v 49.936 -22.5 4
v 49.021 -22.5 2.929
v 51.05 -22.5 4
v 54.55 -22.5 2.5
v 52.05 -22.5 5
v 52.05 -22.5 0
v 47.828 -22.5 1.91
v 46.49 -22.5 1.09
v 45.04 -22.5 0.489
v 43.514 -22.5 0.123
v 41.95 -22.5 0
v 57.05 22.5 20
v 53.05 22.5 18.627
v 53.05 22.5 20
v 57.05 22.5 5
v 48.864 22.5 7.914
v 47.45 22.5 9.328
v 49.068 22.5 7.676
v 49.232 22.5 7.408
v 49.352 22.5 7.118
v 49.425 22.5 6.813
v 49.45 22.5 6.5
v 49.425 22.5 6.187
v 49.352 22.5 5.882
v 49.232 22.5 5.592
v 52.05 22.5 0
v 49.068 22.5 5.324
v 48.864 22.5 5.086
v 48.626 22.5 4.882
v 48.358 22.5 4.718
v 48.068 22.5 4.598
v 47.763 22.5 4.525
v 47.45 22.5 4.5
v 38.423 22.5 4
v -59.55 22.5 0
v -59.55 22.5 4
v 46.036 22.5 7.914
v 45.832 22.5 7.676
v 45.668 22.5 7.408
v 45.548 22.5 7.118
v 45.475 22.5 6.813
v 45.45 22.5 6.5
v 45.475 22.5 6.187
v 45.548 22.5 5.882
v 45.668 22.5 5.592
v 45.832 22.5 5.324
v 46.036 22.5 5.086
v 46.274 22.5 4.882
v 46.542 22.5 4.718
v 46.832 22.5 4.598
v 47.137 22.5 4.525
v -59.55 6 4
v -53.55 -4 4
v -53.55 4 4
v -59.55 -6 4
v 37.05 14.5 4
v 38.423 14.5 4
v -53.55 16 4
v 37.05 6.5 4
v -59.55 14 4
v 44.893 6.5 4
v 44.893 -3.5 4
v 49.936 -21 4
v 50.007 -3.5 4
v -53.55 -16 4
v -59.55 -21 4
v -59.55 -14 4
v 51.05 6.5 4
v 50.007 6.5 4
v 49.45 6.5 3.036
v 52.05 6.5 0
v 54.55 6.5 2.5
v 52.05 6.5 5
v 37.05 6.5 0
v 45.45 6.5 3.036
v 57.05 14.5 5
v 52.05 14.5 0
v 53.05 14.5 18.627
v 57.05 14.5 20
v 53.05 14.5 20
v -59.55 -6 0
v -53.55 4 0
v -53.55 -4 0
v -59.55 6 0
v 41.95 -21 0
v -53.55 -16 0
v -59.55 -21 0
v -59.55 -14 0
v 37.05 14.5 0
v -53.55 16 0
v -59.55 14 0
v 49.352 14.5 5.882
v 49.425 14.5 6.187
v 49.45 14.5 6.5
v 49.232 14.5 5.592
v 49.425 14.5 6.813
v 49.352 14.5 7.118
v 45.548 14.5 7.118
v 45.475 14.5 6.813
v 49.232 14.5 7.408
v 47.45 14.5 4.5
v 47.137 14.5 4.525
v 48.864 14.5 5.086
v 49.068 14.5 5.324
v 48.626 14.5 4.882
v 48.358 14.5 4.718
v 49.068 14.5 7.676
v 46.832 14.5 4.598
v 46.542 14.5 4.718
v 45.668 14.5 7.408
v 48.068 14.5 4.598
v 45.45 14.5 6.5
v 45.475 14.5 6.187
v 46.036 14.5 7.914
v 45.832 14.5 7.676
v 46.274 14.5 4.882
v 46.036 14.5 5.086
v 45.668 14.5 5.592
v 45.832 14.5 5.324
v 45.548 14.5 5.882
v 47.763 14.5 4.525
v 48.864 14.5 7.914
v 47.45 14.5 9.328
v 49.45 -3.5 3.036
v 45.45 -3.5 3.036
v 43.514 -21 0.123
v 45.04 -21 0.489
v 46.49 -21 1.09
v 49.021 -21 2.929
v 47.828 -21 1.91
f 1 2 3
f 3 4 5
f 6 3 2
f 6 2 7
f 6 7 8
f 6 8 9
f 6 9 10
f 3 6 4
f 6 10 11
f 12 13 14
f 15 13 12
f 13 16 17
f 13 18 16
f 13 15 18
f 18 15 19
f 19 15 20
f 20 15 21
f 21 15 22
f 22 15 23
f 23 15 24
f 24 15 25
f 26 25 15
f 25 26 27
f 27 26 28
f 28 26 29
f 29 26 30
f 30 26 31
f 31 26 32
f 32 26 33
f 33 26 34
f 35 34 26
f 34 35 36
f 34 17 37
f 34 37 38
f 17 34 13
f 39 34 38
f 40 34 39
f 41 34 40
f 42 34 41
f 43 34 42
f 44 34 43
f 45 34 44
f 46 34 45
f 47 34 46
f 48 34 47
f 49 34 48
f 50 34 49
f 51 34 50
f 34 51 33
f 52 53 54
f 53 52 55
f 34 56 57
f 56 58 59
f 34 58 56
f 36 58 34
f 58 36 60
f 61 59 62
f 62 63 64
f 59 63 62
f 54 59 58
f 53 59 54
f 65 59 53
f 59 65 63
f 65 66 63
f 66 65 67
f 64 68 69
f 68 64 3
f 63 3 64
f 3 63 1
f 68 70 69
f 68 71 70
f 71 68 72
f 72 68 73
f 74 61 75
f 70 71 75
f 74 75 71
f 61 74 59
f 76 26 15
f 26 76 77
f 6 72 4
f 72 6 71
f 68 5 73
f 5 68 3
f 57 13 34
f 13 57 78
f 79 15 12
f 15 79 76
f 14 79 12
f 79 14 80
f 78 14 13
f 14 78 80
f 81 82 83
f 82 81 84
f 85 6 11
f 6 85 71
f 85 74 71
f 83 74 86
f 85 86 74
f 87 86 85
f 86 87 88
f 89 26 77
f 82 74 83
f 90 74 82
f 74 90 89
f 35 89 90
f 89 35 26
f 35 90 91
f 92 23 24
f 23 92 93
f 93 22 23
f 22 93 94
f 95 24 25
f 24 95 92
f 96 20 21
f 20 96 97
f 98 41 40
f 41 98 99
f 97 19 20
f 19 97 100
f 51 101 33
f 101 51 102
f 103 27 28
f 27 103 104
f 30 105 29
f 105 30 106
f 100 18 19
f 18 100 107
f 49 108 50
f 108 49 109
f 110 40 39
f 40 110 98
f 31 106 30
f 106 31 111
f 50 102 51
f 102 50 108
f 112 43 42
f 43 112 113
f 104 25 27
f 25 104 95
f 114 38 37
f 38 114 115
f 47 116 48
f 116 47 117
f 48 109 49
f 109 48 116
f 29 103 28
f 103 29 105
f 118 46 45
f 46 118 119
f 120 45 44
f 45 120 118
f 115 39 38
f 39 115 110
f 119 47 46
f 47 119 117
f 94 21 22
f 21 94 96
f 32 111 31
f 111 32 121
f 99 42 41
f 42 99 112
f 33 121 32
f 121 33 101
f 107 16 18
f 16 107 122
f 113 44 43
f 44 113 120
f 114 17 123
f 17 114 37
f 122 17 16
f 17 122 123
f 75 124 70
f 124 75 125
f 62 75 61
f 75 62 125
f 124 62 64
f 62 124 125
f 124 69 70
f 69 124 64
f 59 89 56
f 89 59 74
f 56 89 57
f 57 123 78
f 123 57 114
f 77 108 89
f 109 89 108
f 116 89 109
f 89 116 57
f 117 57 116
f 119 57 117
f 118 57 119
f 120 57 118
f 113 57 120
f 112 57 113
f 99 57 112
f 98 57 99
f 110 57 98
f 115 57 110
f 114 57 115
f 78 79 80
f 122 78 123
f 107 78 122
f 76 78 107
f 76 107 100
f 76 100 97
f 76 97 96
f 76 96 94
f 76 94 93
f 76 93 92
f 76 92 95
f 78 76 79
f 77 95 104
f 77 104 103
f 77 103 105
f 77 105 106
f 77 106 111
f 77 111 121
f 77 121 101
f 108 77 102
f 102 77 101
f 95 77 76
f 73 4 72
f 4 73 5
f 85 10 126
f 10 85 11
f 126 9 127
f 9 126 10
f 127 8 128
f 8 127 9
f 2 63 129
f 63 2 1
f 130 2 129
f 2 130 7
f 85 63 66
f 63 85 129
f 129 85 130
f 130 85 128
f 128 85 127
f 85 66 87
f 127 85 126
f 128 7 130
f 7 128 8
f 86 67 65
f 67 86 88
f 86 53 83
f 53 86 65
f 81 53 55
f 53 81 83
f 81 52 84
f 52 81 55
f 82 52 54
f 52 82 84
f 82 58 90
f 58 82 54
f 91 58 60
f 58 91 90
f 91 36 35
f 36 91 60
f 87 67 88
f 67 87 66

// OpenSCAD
// file: ittybox.scad
include <constants.scad>

module panel(wall_thickness, side=false) {
	bolt_x = side ? bolt_offset_y : bolt_offset_x;
	bolt_z = side ? bolt_offset_x : bolt_offset_y;
	width = side ? panel_depth : panel_width;
	overlap_cutout_potition = side ? 0 : -end_corner_height;

	difference() {
		union() {
			// Main panel
			translate([0, 0, wall_thickness/2]) {
				cube([width - corner_radius*2, height, wall_thickness], center=true);
			}

			for (x = [-1, 1]) {
				// Rounded corner
				translate([x*(width/2 - corner_radius), 0, corner_radius]) {
					r = corner_radius;
					rotate([90, 0, 0]) {
						intersection() {
							cylinder(height, r=r, center=true, $fn=4);
							mirror([x > 0 ? 1 : 0, 0, 0]) translate([0, 0, -height/2]) {
								linear_extrude(height=height) polygon([[-r, r], [-r, -r], [r, -r]]);
							}
						}
					}
				}
				overlap_length = corner_overlap - corner_radius;

				// Overlap side
				translate([x*(width/2 - wall_thickness/2), 0, corner_radius + overlap_length/2]) {
					cube([wall_thickness, height, overlap_length], center=true);
				}

				// Corner chamfer
				translate([x*(width/2), height/2 - end_corner_height*2, 0]) {
					mirror([x > 0 ? 1 : 0, 0, 0])
					intersection() {
						rotate([0, 45, 0]) cube([corner_chamfer*2, height*2, corner_chamfer*2], center=true);
						translate([wall_thickness, 0, wall_thickness]) {
							cube([width/2, end_corner_height*2, corner_overlap - wall_thickness], center=false);
						}
					}
				}
			}

			if (side) {
				// Plexi support
				support_height = (panel_width - plexi_width)/2 + 4;
				translate([0, -height/2 + plexi_thickness/2, support_height/2]) {
					cube([width - corner_radius*2, plexi_thickness + 8, support_height], center=true);
				}
			}
		}

		for (x = [-1, 1]) {
			// Bolt hole
			translate([x*(width/2 - bolt_x), height/2 - end_corner_height*2, bolt_z]) {
				rotate([-90, 0, 0]) cylinder(height, d=bolt_diameter, center=false);
				rotate([0, -45, 0]) cube([bolt_diameter/2, height, bolt_diameter/2], center=false);
				bolt_depression = bolt_nut_thickness/2;
				rotate([90, 0, 0]) cylinder(bolt_nut_clearance, d=bolt_nut_width, center=false, $fn=6);
				mirror([0, 1, 0]) translate([-bolt_nut_width/2, 0, 0]) cube([bolt_nut_width, bolt_nut_clearance, bolt_nut_width], center=false);
			}

			// Overlap cutout
			translate([x*(width/2), height/2 + overlap_cutout_potition - end_corner_height/2, 0]) {
				cube([corner_overlap*2, end_corner_height, corner_overlap*4], center=true);
			}

			// Diagonal corner cut
			translate([x*(width/2), height/2 - end_corner_height*2, 0]) {
				mirror([0, 1, 0]) rotate([0, -45, 0]) cube([width, height, width], center=false);
			}
		}
	}
}

module plexi_hole() {
	hull() {
		translate([
			-plexi_width/2 + plexi_hole_offset_x + plexi_hole_diameter/2,
			-plexi_depth/2 + plexi_hole_offset_y + plexi_hole_diameter/2,
			0,
		]) {
			cylinder(plexi_thickness*2, d=plexi_hole_diameter, center=true);
			translate([0, plexi_hole_length - plexi_hole_diameter, 0]) cylinder(plexi_thickness*2, d=plexi_hole_diameter, center=true);
		}
	}
}

module plexi() {
	difference() {
		translate([0, 0, plexi_thickness/2]) {
			minkowski() {
				cube([
					plexi_width - plexi_corner_radius*2,
					plexi_depth - plexi_corner_radius*2,
					plexi_thickness/2,
				], center=true);
				cylinder(plexi_thickness/2, r=plexi_corner_radius, center=true);
			}
		}
		// plexi_hole();
		// mirror([0, 1, 0]) plexi_hole();
		// mirror([1, 0, 0]) plexi_hole();
		// rotate([0, 0, 180]) plexi_hole();
	}
}

module end_panel(wall_thickness) {
	difference() {
		panel(wall_thickness, side=false);
		translate([0, -height/2, panel_depth/2]) rotate([-90, 0, 0]) plexi();
	}
}

module side_panel(wall_thickness) {
	difference() {
		panel(wall_thickness, side=true);
		translate([0, -height/2, panel_width/2]) rotate([-90, 90, 0]) plexi();
	}
}

module button_hole() {
	cylinder(button_panel_thickness*3, d=button_diameter, center=true);
	translate([0, 0, button_panel_thickness])
		cylinder(button_panel_thickness*2, d=button_tab_diameter, center=false);
}

module back_panel() {
	wall_thickness = 8;
	difference() {
		end_panel(wall_thickness);

		// USB port panel
		translate([0, height/2, wall_thickness/2]) {
			cube([usb_panel_width, usb_panel_height*2, usb_panel_depth], center=true);
			cube([usb_panel_width-1, usb_panel_height*2, wall_thickness*2], center=true);
		}

		// Button holes
		translate([0, height/2 - usb_panel_height/2, 0]) {
			offset = usb_panel_width/2;
			for (x = [
				-(offset + button_spacing*2),
				-(offset + button_spacing),
				(offset + button_spacing),
				(offset + button_spacing*2),
			]) {
				translate([x, 0, 0]) {
					button_hole();
				}
			}
		}
	}
}

module front_panel() {
	end_panel(4);
}

module left_panel() {
	side_panel(4);
}

module right_panel() {
	wall_thickness = 4;
	switch_offset_x = panel_depth - 43;
	switch_offset_y = 8;
	difference() {
		side_panel(wall_thickness);
		translate([-panel_depth/2 + switch_offset_x, height/2 - switch_offset_y, 0]) {
			cube([12, 10, wall_thickness*3], center=true);
		}
	}
}

module panel_joint() {
	joint_inner = 8;
	joint_outer = 12;
	joint_length = 6;
	spacing = (joint_inner + joint_outer)/2;
	translate([-joint_length/2, 0, -corner_overlap])
	linear_extrude(height=corner_overlap*3)
	polygon([
		[0, height],
		[-panel_width, height],
		[-panel_width, -height],
		[0, -height],
		[0, -spacing - joint_inner/2],
		[joint_length, -spacing - joint_outer/2],
		[joint_length, -spacing + joint_outer/2],
		[0, -spacing + joint_inner/2],
		[0, spacing - joint_inner/2],
		[joint_length, spacing - joint_outer/2],
		[joint_length, spacing + joint_outer/2],
		[0, spacing + joint_inner/2],
	]);
}

module panel_split() {
  translate([0, -height, -corner_overlap*2])
  mirror([1, 0, 0])
  cube([panel_width, height*2, corner_overlap*4]);
}

back_panel();
translate([0, height*1.5, 0]) front_panel();
translate([0, height*-1.5, 0]) right_panel();
translate([0, height*-3, 0]) left_panel();
// file: constants.scad
$fn = 40;

// AllFightSticks 9.5" Button Panel - Stickless
// https://allfightsticks.com/collections/9-5-enclosures/products/9-5-button-panel?variant=21327143141455
panel_width = 228.2;
panel_depth = 171.5;
bolt_offset_x = 9.6; // distance to center of hole
bolt_offset_y = 6.5; // distance to center of hole
corner_radius = 5;

// FocusAttack Blank Plexi Cover for AllFightSticks 9.5" Solid Bottom Panel
// https://focusattack.com/blank-plexi-cover-for-allfightsticks-9-5-solid-bottom-panel/
plexi_width = 218;
plexi_depth = panel_depth;
plexi_thickness = 1.5;
plexi_hole_offset_x = 11.1; // distance to edge
plexi_hole_offset_y = 8.85; // distance to edge
plexi_hole_diameter = 8;
plexi_hole_length = 14;
plexi_corner_radius = 10;

// Sanwa SDM-18 buttons
// https://paradisearcadeshop.com/home/controls/buttons/sanwa/358-sanwa-sdm-series
button_diameter = 18;
button_tab_diameter = 24;
button_panel_thickness = 3;

// Brook Wireless Fighting Board
// https://www.brookaccessory.com/detail/41130595/
usb_panel_width = 26;
usb_panel_height = 31.2;
usb_panel_depth = 1.6;

// M4 x 20mm internal hex button-head screw
bolt_diameter = 4;
bolt_length = 20;
bolt_nut_thickness = 3.2;
bolt_nut_width = 8; // outer
bolt_nut_clearance = 10;

height = 45;
corner_overlap = 20;
end_corner_height = 8;
corner_chamfer = 16;
button_spacing = button_tab_diameter*1.2;
joint_offset = 0.5; // Accounts for extra length added by joint
// main file
include <constants.scad>
use <ittybox.scad>;

translate([-panel_width/4, 0, 0])
difference() {
  front_panel();
  translate([joint_offset, 0, 0]) panel_joint();
}
